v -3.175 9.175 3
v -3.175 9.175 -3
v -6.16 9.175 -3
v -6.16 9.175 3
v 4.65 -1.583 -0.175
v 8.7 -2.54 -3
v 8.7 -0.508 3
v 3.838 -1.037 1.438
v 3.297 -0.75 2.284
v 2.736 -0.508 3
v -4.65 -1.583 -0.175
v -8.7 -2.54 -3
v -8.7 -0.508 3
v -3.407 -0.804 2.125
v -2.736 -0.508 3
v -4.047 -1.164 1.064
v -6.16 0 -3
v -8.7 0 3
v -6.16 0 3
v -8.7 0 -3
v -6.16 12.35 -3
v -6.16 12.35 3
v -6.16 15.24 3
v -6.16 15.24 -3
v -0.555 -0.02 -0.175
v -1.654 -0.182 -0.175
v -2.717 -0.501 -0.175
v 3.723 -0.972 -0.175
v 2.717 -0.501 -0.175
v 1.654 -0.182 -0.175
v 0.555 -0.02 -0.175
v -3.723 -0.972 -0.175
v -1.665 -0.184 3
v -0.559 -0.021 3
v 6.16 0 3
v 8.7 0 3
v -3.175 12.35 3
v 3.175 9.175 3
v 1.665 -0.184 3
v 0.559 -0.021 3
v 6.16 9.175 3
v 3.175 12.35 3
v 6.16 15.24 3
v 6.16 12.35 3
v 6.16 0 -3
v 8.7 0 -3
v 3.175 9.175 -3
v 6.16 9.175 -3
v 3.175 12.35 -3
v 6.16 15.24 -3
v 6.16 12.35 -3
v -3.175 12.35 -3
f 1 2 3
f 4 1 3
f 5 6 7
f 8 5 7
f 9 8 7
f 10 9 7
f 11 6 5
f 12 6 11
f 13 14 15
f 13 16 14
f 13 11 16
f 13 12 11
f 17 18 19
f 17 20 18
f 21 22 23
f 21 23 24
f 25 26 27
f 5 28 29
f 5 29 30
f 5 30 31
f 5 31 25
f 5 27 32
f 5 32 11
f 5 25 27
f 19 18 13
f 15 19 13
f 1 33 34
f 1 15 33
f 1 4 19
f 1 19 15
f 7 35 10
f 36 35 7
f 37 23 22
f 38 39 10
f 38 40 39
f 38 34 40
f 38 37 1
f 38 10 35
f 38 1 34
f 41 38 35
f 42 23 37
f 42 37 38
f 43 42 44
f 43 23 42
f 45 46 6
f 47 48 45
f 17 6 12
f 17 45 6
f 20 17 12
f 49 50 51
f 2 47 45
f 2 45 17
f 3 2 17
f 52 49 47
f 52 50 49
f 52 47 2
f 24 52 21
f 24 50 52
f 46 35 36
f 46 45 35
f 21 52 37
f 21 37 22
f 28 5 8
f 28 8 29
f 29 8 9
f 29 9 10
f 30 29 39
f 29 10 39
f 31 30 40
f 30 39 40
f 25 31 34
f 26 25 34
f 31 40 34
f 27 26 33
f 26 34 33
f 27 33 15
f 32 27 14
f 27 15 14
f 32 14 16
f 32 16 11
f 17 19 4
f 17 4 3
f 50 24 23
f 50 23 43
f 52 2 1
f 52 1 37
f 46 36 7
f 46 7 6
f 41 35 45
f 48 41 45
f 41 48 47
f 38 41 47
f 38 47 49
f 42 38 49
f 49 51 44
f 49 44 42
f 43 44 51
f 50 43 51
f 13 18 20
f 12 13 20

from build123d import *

# Parameters (mm, degrees)
SKETCH1_W           = 12.319
SKETCH1_H           = 6
BOSS_EXTRUDE1_DEPTH = 15.24
SKETCH1_3_W         = 17.399
SKETCH1_3_H         = 6
BOSS_EXTRUDE2_DEPTH = 2.54
SKETCH2_W           = 2.9845
SKETCH2_H           = 3.175
CUT_EXTRUDE1_DEPTH  = 19.545589779
CUT_EXTRUDE2_DEPTH  = 24.323438876
SKETCH4_R           = 7.62
CUT_EXTRUDE3_DEPTH  = 3.175


with BuildPart() as part:
    # Sketch1 → Boss-Extrude1 (new body)
    with BuildSketch(Plane(origin=(0, 0, 0), x_dir=(1, 0, 0), z_dir=(0, 1, 0))):
        Rectangle(SKETCH1_W, SKETCH1_H)
    extrude(amount=BOSS_EXTRUDE1_DEPTH)

    # Sketch1<3> → Boss-Extrude2 (add)
    with BuildSketch(Plane(origin=(0, 0, 0), x_dir=(1, 0, 0), z_dir=(0, 1, 0))):
        Rectangle(SKETCH1_3_W, SKETCH1_3_H)
    extrude(amount=-BOSS_EXTRUDE2_DEPTH)

    # Sketch2 → Cut-Extrude1 (cut, through all)
    with BuildSketch(Plane(origin=(0, 0, -3), x_dir=(-1, 0, 0), z_dir=(0, 0, -1))):
        with Locations((-4.66725, 10.7625)):
            Rectangle(SKETCH2_W, SKETCH2_H)
        with Locations((4.66725, 10.7625)):
            Rectangle(SKETCH2_W, SKETCH2_H)
    extrude(amount=-CUT_EXTRUDE1_DEPTH, mode=Mode.SUBTRACT)

    # Sketch3 → Cut-Extrude2 (cut, through all)
    with BuildSketch(Plane.ZY.offset(8.6995)):
        Polygon((-3, -2.54), (3, -0.508), (3, -2.54), align=None)
    extrude(amount=-CUT_EXTRUDE2_DEPTH, mode=Mode.SUBTRACT)

    # Sketch4 → Cut-Extrude3 (cut)
    with BuildSketch(Plane.XY.offset(3)):
        with Locations((0, -7.62)):
            Circle(SKETCH4_R)
    extrude(amount=-CUT_EXTRUDE3_DEPTH, mode=Mode.SUBTRACT)


solid = part.part
